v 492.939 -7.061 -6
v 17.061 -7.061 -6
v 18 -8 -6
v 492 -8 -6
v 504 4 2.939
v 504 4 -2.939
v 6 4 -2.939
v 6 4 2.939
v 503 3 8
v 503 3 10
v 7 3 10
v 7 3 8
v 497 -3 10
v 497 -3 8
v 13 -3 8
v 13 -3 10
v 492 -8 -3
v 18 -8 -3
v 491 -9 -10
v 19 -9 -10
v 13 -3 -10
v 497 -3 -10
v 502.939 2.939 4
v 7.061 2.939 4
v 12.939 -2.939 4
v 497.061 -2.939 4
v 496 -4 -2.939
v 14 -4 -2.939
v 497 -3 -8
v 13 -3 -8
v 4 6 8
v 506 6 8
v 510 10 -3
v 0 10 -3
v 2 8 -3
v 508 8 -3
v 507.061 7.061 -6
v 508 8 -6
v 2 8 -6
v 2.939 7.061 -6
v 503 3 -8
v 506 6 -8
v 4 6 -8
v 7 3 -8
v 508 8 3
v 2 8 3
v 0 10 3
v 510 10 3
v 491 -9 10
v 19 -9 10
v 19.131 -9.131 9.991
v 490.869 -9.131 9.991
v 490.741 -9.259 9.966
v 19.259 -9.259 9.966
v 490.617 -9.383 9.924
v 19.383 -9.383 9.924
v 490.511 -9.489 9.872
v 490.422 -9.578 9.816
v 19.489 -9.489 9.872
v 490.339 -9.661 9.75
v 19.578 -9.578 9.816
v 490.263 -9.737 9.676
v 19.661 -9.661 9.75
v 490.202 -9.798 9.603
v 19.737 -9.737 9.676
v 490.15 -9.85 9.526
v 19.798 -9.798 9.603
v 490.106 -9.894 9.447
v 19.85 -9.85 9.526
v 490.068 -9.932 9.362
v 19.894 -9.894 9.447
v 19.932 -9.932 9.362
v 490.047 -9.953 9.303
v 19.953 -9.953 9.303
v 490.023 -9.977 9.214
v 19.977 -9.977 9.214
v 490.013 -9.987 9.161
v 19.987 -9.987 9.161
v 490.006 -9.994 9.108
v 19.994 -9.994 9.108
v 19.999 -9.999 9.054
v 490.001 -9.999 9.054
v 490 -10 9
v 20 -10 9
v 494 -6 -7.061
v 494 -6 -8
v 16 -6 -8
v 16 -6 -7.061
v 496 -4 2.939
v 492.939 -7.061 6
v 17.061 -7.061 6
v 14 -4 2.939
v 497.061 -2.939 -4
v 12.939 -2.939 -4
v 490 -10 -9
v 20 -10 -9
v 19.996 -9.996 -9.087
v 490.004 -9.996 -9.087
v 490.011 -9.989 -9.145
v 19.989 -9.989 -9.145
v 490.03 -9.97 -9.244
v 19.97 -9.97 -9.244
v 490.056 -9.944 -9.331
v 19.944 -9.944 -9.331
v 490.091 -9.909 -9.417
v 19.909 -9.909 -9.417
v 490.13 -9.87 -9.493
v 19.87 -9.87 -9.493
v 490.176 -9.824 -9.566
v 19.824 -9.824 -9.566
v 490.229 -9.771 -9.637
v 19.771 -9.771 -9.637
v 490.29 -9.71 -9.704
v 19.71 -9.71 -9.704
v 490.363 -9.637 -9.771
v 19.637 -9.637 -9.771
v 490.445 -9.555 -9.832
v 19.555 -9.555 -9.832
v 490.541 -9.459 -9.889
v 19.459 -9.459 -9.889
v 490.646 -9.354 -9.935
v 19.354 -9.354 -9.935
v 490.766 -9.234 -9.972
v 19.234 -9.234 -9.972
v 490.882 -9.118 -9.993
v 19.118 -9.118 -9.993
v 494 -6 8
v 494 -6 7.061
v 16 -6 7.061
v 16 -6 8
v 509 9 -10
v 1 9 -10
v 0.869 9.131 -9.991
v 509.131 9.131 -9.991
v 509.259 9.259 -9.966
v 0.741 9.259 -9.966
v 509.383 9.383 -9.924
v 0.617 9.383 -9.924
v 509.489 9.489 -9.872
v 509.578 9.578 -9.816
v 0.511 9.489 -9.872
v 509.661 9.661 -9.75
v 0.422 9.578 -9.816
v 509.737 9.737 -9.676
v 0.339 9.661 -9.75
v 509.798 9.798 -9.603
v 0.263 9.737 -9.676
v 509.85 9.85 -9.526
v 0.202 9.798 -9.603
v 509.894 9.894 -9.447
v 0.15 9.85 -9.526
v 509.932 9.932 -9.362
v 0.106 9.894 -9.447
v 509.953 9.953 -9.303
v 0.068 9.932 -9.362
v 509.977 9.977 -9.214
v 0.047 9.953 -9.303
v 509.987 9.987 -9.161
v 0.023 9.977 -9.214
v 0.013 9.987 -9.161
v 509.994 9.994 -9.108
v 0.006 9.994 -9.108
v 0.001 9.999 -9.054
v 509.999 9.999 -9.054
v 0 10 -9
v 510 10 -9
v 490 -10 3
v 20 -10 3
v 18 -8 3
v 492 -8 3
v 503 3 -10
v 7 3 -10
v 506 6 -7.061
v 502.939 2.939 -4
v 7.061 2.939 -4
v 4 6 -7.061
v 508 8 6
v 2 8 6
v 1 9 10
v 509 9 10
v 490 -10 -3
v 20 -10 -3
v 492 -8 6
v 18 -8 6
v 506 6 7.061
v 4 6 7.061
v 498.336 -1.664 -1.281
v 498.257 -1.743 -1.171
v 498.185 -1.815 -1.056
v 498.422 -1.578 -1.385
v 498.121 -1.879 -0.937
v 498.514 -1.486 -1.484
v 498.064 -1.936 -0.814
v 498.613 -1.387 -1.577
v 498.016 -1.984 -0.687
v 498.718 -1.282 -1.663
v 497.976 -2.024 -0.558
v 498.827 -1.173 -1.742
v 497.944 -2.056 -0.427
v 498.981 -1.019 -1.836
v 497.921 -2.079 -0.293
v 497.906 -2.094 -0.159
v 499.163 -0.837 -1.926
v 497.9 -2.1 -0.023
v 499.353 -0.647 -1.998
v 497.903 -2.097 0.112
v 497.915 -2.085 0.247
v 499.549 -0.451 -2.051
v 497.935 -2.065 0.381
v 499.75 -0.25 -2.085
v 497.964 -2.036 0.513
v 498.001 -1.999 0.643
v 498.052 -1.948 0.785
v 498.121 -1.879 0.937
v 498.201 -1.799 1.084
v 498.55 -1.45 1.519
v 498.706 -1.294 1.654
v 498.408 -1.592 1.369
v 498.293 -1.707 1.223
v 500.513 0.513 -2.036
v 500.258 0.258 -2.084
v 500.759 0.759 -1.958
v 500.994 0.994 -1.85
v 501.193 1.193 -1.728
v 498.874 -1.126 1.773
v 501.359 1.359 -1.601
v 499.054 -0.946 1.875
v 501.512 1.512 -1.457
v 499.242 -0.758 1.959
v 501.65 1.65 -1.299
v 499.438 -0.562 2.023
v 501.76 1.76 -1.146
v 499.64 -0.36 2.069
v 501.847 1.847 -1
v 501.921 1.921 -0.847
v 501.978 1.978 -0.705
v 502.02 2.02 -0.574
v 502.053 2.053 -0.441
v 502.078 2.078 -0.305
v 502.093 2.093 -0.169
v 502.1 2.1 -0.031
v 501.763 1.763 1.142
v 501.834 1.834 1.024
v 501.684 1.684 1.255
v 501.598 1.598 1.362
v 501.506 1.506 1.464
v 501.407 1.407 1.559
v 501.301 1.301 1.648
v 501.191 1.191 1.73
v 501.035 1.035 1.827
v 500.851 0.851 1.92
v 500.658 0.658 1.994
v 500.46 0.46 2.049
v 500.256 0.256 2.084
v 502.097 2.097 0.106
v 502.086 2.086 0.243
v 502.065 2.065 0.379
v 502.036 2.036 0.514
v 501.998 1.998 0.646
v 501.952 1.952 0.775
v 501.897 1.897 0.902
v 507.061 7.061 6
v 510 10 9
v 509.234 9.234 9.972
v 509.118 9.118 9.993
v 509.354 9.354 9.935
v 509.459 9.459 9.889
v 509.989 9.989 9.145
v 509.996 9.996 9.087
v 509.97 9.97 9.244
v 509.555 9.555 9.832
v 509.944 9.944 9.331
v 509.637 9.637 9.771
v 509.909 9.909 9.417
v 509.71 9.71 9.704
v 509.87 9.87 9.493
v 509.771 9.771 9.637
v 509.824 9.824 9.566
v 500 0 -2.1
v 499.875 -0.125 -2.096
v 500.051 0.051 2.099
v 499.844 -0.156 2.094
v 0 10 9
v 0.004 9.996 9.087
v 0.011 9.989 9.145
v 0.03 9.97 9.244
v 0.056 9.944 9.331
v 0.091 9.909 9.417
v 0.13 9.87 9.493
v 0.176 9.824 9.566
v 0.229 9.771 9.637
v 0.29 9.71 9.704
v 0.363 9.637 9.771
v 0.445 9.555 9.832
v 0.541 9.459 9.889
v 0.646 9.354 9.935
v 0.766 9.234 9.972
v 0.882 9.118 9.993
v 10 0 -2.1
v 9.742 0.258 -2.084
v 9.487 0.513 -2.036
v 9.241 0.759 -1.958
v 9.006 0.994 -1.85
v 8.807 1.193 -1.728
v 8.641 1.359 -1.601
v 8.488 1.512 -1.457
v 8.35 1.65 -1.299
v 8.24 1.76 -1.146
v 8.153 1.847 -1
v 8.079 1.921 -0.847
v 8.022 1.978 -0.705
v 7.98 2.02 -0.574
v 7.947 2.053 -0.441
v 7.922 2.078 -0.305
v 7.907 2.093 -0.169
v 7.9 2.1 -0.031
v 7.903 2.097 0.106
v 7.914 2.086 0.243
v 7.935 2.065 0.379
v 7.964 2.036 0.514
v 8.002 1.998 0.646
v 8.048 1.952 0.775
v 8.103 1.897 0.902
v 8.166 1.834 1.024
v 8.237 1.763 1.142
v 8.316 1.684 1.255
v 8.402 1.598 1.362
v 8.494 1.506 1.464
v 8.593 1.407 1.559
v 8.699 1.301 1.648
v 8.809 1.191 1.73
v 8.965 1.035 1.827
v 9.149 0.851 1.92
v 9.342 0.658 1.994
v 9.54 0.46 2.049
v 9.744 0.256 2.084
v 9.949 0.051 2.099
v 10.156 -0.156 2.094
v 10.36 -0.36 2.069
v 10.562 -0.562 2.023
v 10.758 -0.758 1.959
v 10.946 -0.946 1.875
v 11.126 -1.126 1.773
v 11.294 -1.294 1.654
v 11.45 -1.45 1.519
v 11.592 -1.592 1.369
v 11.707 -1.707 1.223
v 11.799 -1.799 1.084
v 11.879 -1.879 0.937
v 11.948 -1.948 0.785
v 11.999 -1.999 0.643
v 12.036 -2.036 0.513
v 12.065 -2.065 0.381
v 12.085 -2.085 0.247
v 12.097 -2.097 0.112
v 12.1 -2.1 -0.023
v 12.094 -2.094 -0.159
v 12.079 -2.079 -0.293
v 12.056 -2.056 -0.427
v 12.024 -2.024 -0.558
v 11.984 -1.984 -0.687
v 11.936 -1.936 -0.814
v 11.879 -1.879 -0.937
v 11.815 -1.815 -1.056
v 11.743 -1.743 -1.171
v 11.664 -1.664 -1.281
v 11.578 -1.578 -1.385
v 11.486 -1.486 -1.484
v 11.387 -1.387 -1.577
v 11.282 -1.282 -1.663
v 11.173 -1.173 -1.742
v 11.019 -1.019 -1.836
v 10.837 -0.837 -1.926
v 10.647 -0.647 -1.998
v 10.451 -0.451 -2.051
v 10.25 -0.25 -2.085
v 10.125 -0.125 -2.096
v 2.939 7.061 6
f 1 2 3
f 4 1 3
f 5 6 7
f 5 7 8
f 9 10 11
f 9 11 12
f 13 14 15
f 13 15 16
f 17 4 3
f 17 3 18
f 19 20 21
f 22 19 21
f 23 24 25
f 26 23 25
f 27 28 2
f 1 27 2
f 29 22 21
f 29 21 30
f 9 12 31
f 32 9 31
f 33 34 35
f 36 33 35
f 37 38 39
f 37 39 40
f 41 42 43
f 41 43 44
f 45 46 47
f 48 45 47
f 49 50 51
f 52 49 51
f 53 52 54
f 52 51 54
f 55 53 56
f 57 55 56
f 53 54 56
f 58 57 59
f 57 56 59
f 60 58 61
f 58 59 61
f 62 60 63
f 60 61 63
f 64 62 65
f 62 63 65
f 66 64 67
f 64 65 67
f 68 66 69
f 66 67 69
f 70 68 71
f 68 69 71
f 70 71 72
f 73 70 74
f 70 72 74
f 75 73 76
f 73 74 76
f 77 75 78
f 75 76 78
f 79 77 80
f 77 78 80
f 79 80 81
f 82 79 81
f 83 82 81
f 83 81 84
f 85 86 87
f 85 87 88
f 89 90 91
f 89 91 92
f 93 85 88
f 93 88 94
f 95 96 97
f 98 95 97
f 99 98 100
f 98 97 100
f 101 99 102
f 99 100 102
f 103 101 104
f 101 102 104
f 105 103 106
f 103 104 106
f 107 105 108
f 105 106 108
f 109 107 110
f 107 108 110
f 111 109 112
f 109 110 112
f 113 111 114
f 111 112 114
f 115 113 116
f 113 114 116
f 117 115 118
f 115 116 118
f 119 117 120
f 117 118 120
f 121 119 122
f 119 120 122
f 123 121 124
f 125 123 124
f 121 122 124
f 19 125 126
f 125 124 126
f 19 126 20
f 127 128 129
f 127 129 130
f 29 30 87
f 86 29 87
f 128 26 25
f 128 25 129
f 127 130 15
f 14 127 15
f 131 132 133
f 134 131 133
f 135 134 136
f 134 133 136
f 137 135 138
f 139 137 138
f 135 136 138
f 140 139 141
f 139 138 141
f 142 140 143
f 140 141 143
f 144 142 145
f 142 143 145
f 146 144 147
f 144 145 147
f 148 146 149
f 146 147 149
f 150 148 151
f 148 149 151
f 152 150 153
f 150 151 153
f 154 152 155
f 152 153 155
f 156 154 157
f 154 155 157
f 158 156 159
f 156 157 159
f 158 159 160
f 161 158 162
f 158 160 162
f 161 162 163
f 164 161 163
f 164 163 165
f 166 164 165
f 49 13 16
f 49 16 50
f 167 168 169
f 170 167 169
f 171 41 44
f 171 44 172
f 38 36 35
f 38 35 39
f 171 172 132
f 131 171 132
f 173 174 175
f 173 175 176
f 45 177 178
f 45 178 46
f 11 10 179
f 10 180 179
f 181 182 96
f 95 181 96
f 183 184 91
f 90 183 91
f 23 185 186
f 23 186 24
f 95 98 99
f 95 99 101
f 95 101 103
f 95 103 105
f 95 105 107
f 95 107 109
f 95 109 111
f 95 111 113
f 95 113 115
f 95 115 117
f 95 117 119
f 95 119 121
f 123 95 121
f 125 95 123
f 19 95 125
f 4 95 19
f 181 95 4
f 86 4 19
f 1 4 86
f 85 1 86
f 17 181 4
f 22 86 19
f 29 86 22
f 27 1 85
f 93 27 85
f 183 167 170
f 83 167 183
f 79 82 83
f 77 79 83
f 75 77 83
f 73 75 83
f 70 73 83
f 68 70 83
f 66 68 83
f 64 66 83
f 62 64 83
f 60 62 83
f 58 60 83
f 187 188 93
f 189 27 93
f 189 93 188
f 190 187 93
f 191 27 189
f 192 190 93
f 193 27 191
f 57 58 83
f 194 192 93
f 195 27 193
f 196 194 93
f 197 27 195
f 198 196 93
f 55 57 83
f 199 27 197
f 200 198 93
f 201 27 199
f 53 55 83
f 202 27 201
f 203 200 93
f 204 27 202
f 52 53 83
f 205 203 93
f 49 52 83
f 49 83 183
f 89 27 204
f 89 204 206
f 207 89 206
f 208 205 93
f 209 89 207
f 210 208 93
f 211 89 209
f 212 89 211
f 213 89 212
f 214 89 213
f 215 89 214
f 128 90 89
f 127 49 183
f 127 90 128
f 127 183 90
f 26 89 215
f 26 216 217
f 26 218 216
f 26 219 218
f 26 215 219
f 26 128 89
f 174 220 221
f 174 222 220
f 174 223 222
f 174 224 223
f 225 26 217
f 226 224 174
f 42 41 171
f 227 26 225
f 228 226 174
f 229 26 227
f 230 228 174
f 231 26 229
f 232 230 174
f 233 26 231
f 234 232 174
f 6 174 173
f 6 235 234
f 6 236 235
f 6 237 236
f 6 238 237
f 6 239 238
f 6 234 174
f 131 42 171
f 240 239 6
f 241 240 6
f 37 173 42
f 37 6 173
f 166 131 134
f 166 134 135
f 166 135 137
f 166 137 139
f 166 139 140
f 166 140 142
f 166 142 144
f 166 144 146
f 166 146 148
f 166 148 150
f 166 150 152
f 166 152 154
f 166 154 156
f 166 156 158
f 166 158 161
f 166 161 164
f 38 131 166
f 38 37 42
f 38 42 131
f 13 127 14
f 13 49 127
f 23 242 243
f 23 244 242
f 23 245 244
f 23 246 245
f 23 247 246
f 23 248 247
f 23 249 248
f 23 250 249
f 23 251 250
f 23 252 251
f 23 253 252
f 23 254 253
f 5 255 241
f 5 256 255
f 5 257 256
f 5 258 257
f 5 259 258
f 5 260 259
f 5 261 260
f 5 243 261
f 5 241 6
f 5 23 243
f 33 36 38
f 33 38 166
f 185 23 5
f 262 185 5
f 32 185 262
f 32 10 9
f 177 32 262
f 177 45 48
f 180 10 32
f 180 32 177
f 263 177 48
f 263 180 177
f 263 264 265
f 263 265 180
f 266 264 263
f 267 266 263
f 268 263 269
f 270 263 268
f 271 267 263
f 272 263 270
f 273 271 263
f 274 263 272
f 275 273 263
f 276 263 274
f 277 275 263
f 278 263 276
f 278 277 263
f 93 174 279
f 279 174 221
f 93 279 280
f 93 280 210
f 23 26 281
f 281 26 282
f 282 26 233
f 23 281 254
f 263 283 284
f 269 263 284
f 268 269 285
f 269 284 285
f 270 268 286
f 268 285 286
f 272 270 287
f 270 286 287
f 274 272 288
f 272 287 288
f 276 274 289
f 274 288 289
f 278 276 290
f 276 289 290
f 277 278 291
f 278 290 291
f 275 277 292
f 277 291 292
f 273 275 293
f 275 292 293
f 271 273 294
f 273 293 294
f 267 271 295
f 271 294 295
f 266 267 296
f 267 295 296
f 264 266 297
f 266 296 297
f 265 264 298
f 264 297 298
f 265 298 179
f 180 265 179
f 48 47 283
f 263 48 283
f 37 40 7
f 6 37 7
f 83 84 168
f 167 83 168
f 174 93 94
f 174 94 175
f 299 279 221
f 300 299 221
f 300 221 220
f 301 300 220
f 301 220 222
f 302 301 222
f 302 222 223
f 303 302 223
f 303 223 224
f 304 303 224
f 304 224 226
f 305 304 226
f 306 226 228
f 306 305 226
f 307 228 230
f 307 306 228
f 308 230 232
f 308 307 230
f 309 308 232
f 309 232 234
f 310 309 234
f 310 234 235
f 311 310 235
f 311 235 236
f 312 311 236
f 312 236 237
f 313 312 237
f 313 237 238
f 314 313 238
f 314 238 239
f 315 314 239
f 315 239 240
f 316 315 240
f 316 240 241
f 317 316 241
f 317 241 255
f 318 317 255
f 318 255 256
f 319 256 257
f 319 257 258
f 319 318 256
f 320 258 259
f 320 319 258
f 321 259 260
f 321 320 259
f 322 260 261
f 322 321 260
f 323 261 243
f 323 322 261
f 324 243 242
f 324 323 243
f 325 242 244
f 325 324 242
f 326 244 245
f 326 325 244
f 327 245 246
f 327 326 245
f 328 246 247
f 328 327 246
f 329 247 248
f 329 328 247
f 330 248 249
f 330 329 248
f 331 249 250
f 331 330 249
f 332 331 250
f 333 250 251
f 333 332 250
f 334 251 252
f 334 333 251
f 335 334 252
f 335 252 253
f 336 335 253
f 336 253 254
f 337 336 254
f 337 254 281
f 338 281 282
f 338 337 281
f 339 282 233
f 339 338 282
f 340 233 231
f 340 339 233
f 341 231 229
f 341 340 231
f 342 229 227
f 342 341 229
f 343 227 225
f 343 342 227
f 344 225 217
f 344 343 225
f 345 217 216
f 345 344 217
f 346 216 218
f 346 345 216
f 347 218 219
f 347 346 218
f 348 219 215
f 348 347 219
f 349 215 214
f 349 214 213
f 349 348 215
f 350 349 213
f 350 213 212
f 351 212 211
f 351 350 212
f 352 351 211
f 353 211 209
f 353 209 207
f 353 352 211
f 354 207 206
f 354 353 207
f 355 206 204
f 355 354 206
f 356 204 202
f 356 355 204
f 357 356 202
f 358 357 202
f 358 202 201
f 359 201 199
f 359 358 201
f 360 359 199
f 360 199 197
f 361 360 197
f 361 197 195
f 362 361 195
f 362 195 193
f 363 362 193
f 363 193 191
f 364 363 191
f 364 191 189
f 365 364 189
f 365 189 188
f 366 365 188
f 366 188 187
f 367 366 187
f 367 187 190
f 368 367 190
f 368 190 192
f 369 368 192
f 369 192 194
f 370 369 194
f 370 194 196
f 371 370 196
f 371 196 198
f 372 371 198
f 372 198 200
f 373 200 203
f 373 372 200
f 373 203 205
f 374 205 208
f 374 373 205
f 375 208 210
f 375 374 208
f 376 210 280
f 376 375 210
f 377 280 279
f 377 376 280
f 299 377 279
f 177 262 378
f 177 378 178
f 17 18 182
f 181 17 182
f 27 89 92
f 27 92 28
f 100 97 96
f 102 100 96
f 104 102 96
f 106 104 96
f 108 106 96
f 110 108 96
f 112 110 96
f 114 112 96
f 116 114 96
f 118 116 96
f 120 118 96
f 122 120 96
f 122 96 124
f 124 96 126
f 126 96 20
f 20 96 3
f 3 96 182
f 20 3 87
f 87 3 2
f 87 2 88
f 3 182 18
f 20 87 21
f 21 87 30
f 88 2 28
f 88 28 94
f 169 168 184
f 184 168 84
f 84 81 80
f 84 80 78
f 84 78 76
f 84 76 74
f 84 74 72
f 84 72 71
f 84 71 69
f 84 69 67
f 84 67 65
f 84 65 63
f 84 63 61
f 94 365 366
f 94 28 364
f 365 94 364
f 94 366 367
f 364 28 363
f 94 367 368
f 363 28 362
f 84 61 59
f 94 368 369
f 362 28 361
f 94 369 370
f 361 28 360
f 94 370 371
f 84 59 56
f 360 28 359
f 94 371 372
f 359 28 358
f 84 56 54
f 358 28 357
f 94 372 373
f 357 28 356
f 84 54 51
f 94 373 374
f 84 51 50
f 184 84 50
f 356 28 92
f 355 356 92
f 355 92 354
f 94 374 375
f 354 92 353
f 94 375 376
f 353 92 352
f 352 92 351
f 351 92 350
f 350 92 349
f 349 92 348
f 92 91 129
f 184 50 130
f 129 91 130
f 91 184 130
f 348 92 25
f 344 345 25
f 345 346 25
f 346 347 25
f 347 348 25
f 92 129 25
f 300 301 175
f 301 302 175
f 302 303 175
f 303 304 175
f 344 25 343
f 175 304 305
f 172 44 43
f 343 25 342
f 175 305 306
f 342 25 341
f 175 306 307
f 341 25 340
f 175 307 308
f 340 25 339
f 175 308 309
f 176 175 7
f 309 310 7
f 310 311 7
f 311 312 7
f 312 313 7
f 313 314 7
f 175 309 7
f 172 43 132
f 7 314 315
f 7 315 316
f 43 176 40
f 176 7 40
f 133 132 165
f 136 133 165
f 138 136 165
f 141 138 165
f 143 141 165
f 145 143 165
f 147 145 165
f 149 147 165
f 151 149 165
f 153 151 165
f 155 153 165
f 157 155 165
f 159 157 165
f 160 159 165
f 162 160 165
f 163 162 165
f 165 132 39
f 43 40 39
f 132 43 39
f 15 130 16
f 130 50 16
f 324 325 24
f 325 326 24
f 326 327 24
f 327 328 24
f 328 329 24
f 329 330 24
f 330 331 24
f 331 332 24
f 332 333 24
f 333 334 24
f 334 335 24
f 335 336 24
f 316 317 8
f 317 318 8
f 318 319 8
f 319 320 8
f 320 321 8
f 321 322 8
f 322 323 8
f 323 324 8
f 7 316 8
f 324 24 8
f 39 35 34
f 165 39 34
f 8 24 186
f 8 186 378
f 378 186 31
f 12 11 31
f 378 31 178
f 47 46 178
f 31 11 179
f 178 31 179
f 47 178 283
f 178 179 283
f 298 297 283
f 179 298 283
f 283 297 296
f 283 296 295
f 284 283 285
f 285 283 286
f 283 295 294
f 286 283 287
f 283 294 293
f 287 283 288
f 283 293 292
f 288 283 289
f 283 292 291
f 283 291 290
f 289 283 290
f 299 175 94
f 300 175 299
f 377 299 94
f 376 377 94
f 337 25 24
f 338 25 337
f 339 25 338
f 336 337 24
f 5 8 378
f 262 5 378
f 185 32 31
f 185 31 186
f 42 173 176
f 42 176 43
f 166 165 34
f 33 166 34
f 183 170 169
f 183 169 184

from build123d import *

# Parameters (mm, degrees)
SKETCH1_R           = 2.1
BOSS_EXTRUDE1_DEPTH = 510
CUT_EXTRUDE1_DEPTH  = 10
CUT_EXTRUDE2_DEPTH  = 10


with BuildPart() as part:
    # Sketch1 → Boss-Extrude1 (new body)
    with BuildSketch(Plane(origin=(0, 0, 0), x_dir=(0, 0, -1), z_dir=(1, 0, 0))):
        with BuildLine():
            Line((-10, 9), (-10, 3))
            Line((-10, 3), (-8, 3))
            Line((-8, 3), (-8, 6))
            Line((-8, 6), (-7.060660172, 6))
            Line((-7.060660172, 6), (-4, 2.939339828))
            Line((-4, 2.939339828), (-4, -2.939339828))
            Line((-4, -2.939339828), (-7.060660172, -6))
            Line((-7.060660172, -6), (-8, -6))
            Line((-8, -6), (-8, -3))
            Line((-8, -3), (-10, -3))
            Line((-10, -3), (-10, -9))
            ThreePointArc((-10, -9), (-9.707106781, -9.707106781), (-9, -10))
            Line((-9, -10), (-3, -10))
            Line((-3, -10), (-3, -8))
            Line((-3, -8), (-6, -8))
            Line((-6, -8), (-6, -7.060660172))
            Line((-6, -7.060660172), (-2.939339828, -4))
            Line((-2.939339828, -4), (2.939339828, -4))
            Line((2.939339828, -4), (6, -7.060660172))
            Line((6, -7.060660172), (6, -8))
            Line((6, -8), (3, -8))
            Line((3, -8), (3, -10))
            Line((3, -10), (9, -10))
            ThreePointArc((9, -10), (9.707106781, -9.707106781), (10, -9))
            Line((10, -9), (10, -3))
            Line((10, -3), (8, -3))
            Line((8, -3), (8, -6))
            Line((8, -6), (7.060660172, -6))
            Line((7.060660172, -6), (4, -2.939339828))
            Line((4, -2.939339828), (4, 2.939339828))
            Line((4, 2.939339828), (7.060660172, 6))
            Line((7.060660172, 6), (8, 6))
            Line((8, 6), (8, 3))
            Line((8, 3), (10, 3))
            Line((10, 3), (10, 9))
            ThreePointArc((10, 9), (9.707106781, 9.707106781), (9, 10))
            Line((9, 10), (3, 10))
            Line((3, 10), (3, 8))
            Line((3, 8), (6, 8))
            Line((6, 8), (6, 7.060660172))
            Line((6, 7.060660172), (2.939339828, 4))
            Line((2.939339828, 4), (-2.939339828, 4))
            Line((-2.939339828, 4), (-6, 7.060660172))
            Line((-6, 7.060660172), (-6, 8))
            Line((-6, 8), (-3, 8))
            Line((-3, 8), (-3, 10))
            Line((-3, 10), (-9, 10))
            ThreePointArc((-9, 10), (-9.707106781, 9.707106781), (-10, 9))
        make_face()
        Circle(SKETCH1_R, mode=Mode.SUBTRACT)
    extrude(amount=BOSS_EXTRUDE1_DEPTH)

    # Sketch28 → Cut-Extrude1 (cut, symmetric)
    with BuildSketch(Plane.XY):
        Polygon((0, 10), (0, -10), (20, -10), align=None)
    extrude(amount=CUT_EXTRUDE1_DEPTH, both=True, mode=Mode.SUBTRACT)

    # Sketch29 → Cut-Extrude2 (cut, symmetric)
    with BuildSketch(Plane.XY):
        Polygon((510, 10), (510, -10), (490, -10), align=None)
    extrude(amount=CUT_EXTRUDE2_DEPTH, both=True, mode=Mode.SUBTRACT)


solid = part.part
